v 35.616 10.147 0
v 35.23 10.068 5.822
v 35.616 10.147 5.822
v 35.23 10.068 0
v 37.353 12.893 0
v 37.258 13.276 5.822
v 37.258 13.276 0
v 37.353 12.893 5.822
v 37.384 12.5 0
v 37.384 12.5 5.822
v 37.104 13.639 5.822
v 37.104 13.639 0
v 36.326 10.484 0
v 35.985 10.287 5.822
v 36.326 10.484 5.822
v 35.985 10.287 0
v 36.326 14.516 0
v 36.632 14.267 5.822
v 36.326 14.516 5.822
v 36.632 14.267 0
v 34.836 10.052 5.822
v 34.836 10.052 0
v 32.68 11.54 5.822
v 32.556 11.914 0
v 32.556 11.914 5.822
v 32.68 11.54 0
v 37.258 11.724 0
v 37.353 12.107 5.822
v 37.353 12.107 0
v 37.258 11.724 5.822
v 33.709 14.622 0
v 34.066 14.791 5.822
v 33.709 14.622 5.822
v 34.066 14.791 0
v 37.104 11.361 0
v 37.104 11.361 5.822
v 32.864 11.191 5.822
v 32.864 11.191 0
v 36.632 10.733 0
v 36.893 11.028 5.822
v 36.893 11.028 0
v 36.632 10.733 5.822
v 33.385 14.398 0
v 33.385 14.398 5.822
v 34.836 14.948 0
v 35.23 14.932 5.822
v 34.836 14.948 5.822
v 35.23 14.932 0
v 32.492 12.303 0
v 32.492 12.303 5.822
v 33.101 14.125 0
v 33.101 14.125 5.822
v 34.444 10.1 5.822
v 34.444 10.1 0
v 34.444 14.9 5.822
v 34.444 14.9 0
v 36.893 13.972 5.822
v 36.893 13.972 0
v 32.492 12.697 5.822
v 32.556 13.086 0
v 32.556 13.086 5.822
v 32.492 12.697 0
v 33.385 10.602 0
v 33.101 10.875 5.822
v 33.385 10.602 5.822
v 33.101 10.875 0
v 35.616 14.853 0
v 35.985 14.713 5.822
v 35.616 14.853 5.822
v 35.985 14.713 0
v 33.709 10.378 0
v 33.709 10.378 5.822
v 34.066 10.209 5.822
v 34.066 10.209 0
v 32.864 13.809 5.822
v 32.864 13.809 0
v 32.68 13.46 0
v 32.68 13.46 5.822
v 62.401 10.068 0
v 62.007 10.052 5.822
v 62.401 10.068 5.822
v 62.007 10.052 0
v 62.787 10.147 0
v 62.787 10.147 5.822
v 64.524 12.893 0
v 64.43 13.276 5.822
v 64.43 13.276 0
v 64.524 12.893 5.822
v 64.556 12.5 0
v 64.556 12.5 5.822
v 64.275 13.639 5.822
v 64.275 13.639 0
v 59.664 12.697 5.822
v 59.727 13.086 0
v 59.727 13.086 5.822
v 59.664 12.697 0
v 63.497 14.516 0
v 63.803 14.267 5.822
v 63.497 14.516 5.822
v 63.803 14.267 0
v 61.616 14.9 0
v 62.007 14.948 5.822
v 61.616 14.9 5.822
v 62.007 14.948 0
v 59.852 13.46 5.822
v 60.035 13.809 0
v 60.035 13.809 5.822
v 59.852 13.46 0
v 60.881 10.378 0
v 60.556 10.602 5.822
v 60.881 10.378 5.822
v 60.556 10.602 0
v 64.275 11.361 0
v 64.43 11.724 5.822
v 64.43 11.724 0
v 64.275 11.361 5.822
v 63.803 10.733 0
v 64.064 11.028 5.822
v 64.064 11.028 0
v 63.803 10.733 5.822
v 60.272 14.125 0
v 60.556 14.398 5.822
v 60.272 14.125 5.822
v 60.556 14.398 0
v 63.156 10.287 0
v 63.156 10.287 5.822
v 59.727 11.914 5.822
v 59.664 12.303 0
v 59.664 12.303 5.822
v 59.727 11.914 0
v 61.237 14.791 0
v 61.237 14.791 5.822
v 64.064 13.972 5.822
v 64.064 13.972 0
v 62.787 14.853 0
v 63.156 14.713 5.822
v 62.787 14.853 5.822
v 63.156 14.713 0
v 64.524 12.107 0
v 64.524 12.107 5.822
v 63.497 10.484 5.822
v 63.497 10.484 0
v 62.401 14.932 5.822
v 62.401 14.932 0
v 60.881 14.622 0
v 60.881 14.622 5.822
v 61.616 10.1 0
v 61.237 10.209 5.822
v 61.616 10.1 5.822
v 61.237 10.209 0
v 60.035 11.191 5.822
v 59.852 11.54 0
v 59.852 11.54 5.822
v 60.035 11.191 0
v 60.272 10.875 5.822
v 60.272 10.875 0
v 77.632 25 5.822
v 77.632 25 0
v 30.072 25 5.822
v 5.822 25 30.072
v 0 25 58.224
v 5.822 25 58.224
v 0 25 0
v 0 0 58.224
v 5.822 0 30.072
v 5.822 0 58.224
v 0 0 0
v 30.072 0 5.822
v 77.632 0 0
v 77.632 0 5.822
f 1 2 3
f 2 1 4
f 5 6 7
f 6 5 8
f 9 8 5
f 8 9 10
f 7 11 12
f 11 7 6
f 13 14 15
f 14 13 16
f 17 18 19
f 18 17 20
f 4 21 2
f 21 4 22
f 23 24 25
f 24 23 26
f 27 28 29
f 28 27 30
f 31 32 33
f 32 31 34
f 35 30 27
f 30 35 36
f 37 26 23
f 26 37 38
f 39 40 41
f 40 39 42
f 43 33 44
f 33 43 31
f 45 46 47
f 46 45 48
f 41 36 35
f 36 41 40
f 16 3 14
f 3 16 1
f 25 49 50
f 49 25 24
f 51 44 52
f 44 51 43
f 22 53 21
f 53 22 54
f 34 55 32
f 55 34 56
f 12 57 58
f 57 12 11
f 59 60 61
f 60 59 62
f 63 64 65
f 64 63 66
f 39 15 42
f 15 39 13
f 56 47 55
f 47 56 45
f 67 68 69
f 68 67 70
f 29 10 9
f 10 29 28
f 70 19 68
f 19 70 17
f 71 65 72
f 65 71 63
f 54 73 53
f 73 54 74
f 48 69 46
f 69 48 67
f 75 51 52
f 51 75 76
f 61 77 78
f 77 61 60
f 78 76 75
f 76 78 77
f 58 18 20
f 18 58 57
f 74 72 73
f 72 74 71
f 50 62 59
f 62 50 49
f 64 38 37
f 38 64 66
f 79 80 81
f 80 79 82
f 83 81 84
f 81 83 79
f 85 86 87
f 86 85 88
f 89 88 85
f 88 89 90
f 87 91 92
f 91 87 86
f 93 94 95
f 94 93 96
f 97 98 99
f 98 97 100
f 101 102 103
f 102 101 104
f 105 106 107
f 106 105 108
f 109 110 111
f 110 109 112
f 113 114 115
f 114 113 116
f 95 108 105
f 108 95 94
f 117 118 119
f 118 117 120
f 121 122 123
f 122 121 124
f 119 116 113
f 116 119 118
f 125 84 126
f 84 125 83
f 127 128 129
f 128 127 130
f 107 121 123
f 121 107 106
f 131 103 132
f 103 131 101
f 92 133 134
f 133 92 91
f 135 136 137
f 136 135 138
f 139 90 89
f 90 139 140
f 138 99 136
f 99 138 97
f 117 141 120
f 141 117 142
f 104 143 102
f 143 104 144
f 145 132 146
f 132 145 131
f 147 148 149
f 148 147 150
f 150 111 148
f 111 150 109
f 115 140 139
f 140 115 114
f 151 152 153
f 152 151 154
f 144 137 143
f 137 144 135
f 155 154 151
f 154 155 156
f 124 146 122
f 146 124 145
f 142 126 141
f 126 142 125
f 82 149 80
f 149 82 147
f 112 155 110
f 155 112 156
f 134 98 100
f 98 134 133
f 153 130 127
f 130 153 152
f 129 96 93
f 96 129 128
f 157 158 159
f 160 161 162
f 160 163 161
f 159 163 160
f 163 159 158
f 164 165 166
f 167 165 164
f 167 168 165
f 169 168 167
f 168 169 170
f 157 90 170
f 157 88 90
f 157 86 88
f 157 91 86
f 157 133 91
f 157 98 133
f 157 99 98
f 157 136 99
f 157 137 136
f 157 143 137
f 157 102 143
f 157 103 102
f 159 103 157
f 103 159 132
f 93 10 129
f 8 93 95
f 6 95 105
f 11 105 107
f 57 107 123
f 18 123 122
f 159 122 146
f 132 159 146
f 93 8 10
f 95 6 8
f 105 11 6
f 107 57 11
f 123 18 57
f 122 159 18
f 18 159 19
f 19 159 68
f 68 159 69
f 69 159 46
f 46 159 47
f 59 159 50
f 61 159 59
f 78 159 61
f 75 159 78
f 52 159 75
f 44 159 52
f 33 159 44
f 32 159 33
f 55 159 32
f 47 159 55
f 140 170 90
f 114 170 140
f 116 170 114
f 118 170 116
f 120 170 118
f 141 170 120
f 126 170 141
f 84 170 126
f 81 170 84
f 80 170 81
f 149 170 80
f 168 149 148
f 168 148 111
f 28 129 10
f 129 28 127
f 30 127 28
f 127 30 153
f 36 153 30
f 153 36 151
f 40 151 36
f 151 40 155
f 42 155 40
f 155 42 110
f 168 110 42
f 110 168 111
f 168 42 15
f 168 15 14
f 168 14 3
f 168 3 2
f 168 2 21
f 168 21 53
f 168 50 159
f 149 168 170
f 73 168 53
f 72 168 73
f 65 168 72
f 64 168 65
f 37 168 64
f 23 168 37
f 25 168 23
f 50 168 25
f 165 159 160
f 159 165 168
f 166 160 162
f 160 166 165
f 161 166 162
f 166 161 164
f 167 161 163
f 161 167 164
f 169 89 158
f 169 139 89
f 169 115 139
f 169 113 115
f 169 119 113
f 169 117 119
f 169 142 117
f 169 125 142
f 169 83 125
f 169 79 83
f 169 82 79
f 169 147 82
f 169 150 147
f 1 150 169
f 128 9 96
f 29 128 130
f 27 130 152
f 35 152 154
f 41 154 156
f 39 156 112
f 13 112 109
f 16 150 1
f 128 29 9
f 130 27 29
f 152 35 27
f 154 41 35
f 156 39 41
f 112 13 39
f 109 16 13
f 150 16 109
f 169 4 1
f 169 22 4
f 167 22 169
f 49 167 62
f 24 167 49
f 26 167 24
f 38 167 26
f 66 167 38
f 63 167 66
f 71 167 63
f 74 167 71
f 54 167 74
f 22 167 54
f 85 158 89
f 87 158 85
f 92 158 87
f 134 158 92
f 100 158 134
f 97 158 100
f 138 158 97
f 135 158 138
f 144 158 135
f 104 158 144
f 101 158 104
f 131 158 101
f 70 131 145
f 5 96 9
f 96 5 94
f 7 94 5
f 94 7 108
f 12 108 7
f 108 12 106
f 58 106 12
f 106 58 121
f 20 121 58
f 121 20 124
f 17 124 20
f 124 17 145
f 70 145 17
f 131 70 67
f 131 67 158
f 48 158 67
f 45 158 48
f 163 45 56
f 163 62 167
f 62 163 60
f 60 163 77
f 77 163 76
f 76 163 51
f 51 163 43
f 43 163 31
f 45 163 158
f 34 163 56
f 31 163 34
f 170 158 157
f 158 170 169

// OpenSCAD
// @checkpoint parent= desc="Soporte en L cuya escala sale de una moneda de la foto"
// Receta de la skill openscad-from-image: una pieza armada con primitivas a
// partir de medidas LEÍDAS EN PÍXELES de una foto. La escala sale de un objeto
// de medida conocida (una moneda) que está en el mismo plano que la pieza.
// Lo que la foto no muestra (el ancho del soporte, el grosor) es un supuesto y
// queda como parámetro: cámbialo con las medidas reales.

/* [Escala de la foto] */
// Diámetro real del objeto de escala, en mm (aquí una moneda de 25 centavos de USD: 24.26)
ref_mm = 24.26;
// Lo que mide ese objeto en la foto, en píxeles (image_info con `region` sobre la moneda)
ref_px = 150;

/* [Medidas leídas en la foto, en píxeles] */
base_len_px = 480;    // largo de la base
base_thick_px = 36;   // grosor de la base
wall_height_px = 360; // alto de la pared vertical
wall_thick_px = 36;   // grosor de la pared
gusset_px = 150;      // lado del refuerzo triangular (0 = sin refuerzo)

/* [Supuestos: no se ven en la foto] */
// Ancho del soporte (la profundidad que la foto no muestra)
bracket_w = 25;       // [10:1:80]
// Tornillo de las dos perforaciones de la base (M4 → 4.5 pasante, serie media ISO 273)
hole_d = 4.5;         // [2.2:0.1:9]
// Holgura que se suma al agujero para FDM
clearance = 0.2;      // [0:0.05:0.6]
bracket_color = "#9ca3af";

/* [Hidden] */
eps = 0.01;
$fa = $preview ? 12 : 4;
$fs = $preview ? 2 : 0.4;

// De píxeles a milímetros con la regla de tres de la moneda.
mm_per_px = ref_mm / ref_px;
function mm(px) = px * mm_per_px;

base_len = mm(base_len_px);
base_t = mm(base_thick_px);
wall_h = mm(wall_height_px);
wall_t = mm(wall_thick_px);
gusset = mm(gusset_px);

module profile() {
    // Perfil en L en el plano XZ: base a lo largo de X y pared en x = 0.
    union() {
        square([base_len, base_t]);
        square([wall_t, wall_h]);
        if (gusset > 0)
            polygon([[wall_t - eps, base_t - eps], [wall_t - eps, base_t + gusset], [wall_t + gusset, base_t - eps]]);
    }
}

module bracket() {
    difference() {
        // Extruye el perfil a lo ancho (Y) con la cara frontal en y = 0.
        rotate([90, 0, 0]) translate([0, 0, -bracket_w]) linear_extrude(bracket_w) profile();
        // Dos agujeros pasantes en la base, lejos de la pared.
        for (k = [0.45, 0.8])
            translate([base_len * k, bracket_w / 2, -eps])
                cylinder(d = hole_d + 2 * clearance, h = base_t + 2 * eps);
    }
}

color(bracket_color) bracket();
